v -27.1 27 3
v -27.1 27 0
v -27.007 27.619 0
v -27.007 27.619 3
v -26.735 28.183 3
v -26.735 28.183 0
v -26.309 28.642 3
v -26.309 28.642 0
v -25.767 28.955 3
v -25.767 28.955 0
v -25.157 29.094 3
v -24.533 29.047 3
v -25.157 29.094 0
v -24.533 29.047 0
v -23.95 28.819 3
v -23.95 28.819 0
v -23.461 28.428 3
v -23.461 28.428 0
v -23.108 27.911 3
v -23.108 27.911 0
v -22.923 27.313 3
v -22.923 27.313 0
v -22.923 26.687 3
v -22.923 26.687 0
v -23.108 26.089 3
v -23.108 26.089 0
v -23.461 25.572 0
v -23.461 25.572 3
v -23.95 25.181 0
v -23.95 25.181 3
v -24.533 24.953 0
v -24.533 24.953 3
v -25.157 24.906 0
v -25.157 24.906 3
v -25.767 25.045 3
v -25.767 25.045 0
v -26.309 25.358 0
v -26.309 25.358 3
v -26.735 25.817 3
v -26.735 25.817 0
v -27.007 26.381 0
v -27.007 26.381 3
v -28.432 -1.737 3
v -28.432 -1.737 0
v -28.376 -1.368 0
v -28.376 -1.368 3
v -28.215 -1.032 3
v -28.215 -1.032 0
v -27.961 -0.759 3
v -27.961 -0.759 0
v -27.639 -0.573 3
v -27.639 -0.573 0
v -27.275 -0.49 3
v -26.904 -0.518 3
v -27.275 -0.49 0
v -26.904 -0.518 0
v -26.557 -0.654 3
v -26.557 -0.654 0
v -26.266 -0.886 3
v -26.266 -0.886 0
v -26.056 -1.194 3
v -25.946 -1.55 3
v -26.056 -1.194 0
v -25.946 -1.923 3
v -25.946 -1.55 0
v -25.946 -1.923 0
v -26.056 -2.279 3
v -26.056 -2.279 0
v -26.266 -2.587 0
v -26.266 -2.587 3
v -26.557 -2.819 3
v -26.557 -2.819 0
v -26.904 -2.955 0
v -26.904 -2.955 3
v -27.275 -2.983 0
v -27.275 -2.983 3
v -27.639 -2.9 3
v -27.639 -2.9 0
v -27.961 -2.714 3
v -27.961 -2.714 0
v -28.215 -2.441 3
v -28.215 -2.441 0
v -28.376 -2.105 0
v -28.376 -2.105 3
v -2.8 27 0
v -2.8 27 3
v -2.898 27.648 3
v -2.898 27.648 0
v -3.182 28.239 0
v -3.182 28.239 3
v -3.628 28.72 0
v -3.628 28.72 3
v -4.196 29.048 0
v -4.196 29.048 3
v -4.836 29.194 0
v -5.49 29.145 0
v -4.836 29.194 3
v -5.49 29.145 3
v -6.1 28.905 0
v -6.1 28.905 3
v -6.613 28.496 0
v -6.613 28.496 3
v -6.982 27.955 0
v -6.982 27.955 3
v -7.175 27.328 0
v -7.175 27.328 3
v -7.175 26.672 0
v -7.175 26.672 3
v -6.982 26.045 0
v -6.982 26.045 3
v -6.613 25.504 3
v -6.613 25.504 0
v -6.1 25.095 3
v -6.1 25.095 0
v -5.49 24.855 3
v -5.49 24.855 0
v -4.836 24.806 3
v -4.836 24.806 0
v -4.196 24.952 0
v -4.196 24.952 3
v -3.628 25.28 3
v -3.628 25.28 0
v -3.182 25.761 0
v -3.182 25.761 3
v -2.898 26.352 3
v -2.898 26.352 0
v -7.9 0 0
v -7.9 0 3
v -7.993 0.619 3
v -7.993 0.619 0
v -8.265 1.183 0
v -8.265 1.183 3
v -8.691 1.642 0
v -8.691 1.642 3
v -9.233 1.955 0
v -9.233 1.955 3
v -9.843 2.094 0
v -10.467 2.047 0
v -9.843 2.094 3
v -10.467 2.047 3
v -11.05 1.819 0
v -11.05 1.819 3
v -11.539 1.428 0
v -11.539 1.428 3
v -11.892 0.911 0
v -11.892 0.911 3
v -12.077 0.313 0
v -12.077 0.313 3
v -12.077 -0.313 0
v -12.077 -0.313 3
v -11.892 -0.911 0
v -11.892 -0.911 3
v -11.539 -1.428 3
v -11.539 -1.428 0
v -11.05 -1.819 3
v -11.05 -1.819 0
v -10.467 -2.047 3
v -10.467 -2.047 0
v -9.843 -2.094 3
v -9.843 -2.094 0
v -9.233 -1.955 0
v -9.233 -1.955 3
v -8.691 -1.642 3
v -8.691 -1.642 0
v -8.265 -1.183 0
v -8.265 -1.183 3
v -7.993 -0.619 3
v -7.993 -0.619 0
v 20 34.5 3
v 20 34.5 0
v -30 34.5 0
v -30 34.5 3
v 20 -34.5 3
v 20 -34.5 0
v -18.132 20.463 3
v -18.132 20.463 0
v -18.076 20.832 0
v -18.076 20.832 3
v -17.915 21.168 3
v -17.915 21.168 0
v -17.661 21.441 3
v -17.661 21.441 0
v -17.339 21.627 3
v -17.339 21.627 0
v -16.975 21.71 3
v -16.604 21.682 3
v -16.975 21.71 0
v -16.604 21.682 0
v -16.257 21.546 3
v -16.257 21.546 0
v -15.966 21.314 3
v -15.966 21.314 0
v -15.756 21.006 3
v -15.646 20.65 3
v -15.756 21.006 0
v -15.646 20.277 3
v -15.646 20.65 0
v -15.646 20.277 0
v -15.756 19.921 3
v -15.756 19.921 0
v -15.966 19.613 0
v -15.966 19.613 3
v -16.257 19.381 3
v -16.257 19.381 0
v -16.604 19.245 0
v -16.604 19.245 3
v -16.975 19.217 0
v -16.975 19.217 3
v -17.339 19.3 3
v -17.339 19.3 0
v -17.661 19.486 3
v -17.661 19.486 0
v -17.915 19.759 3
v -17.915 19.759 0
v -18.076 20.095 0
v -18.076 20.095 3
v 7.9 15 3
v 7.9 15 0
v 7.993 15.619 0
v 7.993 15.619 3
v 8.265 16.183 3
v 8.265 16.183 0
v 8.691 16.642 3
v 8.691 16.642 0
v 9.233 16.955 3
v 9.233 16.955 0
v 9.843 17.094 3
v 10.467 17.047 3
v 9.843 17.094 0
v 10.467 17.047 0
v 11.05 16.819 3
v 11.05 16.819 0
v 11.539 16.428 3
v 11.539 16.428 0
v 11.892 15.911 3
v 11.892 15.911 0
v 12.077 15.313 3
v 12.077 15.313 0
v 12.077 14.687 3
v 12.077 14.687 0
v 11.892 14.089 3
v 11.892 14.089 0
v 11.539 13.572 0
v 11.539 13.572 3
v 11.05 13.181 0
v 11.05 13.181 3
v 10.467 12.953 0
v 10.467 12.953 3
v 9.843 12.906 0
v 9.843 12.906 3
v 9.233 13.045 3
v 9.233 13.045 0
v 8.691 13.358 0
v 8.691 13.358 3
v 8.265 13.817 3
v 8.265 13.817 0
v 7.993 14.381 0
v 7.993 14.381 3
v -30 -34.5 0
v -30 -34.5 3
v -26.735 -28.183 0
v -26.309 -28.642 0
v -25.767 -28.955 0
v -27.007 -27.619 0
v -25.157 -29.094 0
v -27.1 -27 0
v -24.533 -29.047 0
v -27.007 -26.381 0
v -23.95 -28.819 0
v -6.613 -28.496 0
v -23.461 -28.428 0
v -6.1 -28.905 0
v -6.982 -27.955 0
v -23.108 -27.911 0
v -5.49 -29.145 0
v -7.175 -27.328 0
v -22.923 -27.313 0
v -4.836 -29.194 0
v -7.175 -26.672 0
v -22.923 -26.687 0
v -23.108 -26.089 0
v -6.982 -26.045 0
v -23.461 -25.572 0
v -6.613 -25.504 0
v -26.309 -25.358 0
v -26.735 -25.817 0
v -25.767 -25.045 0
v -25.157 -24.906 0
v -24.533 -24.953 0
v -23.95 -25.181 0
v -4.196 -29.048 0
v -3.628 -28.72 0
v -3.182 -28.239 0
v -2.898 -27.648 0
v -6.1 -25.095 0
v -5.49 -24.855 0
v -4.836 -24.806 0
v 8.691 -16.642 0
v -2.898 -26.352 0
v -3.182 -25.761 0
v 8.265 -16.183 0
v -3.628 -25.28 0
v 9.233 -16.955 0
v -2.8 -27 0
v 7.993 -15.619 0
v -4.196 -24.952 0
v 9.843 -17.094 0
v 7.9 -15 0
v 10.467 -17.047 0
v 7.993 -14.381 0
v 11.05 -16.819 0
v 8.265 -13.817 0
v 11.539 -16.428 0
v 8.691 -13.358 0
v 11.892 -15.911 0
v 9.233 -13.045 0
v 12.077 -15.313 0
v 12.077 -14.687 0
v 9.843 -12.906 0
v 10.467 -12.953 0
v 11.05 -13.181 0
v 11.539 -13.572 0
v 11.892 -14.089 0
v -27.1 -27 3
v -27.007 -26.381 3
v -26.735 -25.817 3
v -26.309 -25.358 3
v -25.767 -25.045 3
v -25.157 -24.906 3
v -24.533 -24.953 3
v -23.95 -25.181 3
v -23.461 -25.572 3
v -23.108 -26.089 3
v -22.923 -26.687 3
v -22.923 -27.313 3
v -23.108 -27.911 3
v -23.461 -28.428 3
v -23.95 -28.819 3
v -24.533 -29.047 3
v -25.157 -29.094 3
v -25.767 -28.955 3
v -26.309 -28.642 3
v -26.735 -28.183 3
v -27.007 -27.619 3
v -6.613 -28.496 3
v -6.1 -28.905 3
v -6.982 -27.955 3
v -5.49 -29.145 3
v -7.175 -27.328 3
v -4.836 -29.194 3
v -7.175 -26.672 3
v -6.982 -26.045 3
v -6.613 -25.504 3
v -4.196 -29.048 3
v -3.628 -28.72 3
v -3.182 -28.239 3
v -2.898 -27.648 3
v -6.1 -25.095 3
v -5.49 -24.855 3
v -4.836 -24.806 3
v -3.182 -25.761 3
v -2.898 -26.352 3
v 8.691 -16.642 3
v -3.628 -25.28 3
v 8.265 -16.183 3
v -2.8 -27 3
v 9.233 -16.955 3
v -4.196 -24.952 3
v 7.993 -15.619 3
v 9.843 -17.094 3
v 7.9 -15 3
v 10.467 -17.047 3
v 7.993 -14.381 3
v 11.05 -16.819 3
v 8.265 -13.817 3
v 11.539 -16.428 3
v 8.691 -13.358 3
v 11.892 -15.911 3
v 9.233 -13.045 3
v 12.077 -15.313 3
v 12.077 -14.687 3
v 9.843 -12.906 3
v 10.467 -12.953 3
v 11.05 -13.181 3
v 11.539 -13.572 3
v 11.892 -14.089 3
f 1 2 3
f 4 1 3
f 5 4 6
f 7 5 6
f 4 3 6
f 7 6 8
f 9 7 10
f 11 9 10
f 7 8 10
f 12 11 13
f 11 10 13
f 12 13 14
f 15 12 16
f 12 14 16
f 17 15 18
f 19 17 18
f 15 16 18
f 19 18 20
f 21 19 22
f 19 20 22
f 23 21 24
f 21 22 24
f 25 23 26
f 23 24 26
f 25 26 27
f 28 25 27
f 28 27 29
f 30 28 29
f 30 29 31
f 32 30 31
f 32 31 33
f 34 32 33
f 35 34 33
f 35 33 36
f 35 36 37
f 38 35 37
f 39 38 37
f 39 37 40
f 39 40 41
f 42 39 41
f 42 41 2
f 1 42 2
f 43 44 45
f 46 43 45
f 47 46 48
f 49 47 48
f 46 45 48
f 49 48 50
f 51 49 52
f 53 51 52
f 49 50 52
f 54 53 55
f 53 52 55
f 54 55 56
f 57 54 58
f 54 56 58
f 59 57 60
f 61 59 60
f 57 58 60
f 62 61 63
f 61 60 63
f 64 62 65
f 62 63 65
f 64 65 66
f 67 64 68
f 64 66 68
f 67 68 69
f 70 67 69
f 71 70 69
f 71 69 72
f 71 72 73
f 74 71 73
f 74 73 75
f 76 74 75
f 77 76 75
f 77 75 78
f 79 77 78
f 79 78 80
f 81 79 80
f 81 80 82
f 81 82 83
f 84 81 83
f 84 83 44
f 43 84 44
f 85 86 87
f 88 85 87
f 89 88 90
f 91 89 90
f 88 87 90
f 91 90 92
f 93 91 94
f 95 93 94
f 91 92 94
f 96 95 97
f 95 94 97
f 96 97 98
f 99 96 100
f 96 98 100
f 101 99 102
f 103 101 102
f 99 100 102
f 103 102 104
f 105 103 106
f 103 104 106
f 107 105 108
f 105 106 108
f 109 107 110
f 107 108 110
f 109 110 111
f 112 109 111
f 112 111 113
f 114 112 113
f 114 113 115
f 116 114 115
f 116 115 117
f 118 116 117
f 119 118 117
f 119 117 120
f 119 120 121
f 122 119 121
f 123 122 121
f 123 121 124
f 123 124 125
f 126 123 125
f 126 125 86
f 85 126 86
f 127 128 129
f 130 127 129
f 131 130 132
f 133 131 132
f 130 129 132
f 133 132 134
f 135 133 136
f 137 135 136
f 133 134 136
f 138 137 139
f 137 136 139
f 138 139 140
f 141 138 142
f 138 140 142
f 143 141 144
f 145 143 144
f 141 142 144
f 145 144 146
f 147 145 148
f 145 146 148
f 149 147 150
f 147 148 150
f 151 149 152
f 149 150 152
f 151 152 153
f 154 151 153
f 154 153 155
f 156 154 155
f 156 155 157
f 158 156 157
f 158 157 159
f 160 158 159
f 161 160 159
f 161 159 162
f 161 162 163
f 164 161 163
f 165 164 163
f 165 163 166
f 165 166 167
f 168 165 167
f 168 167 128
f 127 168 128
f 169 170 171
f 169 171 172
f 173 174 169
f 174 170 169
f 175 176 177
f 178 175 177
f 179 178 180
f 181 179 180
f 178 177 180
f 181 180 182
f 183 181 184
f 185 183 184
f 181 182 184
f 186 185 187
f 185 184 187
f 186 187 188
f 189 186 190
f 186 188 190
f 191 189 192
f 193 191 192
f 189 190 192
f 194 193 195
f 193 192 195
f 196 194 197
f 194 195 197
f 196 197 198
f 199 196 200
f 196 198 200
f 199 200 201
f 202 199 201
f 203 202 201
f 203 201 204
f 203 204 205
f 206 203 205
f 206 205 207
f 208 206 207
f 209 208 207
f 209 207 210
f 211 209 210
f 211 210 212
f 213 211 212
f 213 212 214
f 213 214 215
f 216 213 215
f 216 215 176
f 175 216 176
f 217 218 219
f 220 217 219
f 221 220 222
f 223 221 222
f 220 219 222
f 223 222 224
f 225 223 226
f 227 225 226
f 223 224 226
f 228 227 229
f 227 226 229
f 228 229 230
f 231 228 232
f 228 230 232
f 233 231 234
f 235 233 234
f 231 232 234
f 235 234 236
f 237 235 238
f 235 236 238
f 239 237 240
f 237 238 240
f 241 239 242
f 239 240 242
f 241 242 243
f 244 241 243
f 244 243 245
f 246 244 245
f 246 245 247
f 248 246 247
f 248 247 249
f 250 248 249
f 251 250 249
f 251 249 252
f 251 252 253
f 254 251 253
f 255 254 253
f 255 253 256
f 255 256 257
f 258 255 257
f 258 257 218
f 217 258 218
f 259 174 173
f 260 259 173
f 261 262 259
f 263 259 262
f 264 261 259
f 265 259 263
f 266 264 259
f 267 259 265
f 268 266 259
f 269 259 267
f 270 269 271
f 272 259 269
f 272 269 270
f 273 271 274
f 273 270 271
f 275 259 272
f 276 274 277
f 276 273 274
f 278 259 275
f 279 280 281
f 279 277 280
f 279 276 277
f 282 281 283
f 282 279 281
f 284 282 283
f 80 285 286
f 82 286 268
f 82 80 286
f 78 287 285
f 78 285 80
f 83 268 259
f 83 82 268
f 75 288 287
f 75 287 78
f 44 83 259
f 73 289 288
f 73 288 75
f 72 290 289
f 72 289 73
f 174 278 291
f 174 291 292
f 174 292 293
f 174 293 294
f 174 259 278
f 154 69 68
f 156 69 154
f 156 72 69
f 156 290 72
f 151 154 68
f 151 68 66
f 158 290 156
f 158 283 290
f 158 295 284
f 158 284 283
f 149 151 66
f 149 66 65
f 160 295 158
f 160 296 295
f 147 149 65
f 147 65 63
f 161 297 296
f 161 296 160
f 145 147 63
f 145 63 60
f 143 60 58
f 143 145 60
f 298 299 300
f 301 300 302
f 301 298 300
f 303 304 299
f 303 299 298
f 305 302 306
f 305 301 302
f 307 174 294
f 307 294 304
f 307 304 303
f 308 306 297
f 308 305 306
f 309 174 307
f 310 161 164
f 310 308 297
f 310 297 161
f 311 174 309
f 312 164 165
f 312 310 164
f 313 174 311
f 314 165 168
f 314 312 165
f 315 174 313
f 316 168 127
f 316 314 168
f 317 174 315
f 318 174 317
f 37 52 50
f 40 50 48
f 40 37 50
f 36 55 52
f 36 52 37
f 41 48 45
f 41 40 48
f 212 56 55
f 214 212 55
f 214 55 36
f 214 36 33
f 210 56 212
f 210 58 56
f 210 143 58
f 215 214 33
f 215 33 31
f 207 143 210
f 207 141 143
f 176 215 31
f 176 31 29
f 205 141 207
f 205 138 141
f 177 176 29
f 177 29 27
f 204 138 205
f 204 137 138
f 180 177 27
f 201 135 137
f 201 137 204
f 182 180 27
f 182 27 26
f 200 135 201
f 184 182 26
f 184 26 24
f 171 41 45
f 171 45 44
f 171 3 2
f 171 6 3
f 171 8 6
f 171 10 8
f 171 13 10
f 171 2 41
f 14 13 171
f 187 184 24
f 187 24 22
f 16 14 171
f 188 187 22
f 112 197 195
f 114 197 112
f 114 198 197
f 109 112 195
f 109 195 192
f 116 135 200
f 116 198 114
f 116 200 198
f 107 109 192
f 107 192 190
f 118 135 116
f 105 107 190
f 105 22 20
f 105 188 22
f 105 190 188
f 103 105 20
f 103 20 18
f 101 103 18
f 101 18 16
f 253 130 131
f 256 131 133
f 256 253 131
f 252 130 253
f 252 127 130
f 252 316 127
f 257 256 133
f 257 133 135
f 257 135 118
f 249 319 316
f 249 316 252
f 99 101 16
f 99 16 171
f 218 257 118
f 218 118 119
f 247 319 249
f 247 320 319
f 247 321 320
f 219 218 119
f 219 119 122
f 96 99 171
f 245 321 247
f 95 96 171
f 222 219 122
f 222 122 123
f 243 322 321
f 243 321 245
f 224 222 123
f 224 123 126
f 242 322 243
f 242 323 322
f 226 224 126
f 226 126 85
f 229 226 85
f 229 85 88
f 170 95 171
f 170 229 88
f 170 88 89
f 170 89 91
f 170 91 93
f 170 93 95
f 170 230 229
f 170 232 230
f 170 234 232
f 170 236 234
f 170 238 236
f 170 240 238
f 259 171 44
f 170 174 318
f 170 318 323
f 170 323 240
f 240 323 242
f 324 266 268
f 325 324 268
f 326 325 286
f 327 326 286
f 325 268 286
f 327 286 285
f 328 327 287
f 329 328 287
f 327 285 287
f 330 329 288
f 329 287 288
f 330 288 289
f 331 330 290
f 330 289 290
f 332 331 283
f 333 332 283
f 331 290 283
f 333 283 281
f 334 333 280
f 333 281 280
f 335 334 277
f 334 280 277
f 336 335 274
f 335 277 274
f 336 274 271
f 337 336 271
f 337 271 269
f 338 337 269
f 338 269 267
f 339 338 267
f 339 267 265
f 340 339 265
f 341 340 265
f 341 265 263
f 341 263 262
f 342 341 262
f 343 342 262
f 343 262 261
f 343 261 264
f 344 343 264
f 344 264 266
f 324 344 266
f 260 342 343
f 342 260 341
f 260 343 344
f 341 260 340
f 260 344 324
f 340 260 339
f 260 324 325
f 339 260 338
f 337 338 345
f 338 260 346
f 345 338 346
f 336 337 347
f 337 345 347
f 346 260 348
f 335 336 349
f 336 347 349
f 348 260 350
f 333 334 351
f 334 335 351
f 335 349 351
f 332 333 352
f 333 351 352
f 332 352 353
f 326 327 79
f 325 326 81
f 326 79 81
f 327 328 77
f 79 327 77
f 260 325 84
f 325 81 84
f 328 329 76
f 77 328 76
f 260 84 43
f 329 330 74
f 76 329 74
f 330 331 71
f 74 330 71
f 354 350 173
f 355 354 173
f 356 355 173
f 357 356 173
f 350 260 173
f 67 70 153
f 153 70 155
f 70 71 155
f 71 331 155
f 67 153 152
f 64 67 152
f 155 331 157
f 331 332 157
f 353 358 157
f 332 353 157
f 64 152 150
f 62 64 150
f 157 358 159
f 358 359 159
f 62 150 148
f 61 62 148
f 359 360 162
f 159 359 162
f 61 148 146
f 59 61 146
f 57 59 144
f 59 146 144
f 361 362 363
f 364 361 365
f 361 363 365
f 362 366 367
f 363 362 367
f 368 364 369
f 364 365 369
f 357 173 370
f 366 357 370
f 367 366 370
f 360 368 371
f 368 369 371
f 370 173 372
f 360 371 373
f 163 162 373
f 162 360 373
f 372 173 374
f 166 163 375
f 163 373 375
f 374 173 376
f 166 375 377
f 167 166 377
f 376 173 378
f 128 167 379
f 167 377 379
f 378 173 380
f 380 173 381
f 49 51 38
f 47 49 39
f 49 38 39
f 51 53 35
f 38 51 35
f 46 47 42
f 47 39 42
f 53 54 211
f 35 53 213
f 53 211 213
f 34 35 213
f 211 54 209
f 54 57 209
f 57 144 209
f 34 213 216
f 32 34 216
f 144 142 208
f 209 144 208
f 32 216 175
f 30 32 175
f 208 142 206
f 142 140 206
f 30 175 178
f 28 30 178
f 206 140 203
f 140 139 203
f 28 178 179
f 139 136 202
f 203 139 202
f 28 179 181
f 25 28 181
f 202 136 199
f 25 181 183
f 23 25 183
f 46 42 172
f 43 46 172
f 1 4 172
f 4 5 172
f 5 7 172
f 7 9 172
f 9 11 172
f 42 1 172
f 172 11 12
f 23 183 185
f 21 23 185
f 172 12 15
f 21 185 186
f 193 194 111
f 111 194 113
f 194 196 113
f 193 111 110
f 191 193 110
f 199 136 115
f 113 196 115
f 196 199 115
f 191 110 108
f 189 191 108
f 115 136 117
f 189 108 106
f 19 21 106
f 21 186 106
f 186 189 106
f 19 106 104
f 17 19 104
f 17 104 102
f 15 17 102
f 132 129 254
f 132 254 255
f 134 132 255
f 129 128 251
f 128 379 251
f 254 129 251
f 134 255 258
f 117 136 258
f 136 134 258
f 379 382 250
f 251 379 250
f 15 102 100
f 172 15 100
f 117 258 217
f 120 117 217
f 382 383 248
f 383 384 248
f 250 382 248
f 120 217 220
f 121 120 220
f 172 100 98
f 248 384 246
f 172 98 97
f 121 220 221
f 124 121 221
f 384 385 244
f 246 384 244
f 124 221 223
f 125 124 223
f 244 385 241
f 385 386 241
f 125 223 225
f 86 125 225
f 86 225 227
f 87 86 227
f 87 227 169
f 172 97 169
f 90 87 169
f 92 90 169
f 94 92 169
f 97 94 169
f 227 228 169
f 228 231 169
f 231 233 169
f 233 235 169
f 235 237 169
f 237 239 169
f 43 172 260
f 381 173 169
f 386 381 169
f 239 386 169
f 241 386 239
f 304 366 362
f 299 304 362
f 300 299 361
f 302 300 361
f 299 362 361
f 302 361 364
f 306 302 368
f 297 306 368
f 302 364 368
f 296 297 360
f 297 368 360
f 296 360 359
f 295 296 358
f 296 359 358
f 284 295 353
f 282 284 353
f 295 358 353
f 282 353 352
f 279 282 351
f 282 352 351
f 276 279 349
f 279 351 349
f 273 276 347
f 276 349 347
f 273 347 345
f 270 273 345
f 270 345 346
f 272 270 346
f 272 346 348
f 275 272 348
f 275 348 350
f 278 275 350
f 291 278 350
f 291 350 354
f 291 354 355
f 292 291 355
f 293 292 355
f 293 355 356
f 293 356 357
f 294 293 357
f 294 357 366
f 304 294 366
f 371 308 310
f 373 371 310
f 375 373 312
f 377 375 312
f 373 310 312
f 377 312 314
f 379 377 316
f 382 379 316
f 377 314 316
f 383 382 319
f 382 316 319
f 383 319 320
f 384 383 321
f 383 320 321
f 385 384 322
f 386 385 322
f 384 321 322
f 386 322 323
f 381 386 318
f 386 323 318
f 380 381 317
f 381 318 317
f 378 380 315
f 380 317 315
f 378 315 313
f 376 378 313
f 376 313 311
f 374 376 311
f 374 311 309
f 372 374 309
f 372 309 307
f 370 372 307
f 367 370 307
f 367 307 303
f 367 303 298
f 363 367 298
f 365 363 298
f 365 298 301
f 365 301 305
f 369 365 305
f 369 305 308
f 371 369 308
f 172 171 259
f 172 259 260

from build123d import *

# Parameters (mm, degrees)
SKETCH_1_W          = 40
SKETCH_1_H          = 29
EXTRUDE_1_DEPTH     = 3
SKETCH_3_W          = 40
SKETCH_3_H          = 3
EXTRUDE_2_DEPTH     = 3
SKETCH_4_W          = 40
SKETCH_4_H          = 3
EXTRUDE_3_DEPTH     = 3
SKETCH_5_W          = 40
SKETCH_5_H          = 3
EXTRUDE_4_DEPTH     = 7
SKETCH_6_W          = 40
SKETCH_6_H          = 3
EXTRUDE_5_DEPTH     = 7
SKETCH_7_W          = 40
SKETCH_7_H          = 3
EXTRUDE_6_DEPTH     = 10
SKETCH_8_W          = 40
SKETCH_8_H          = 3
EXTRUDE_7_DEPTH     = 10
SKETCH_9_R          = 2.2
CUT_EXTRUDE_2_DEPTH = 15
CUT_EXTRUDE_3_DEPTH = 4
SKETCH_12_W         = 3
SKETCH_12_H         = 69
EXTRUDE_9_DEPTH     = 30
SKETCH_15_R         = 2.1
CUT_EXTRUDE_4_DEPTH = 10
SKETCH_16_R         = 2.1
CUT_EXTRUDE_5_DEPTH = 10
SKETCH_17_W         = 3
SKETCH_17_H         = 69
CUT_EXTRUDE_6_DEPTH = 20
M3X0_5_1_D          = 2.5
M3X0_5_1_DEPTH      = 8.5
M3X0_5_1_TIP        = 0.751075774
SKETCH_20_R         = 2.1
CUT_EXTRUDE_7_DEPTH = 10


with BuildPart() as part:
    # ｽｹｯﾁ1 → ﾎﾞｽ - 押し出し1 (new body)
    with BuildSketch(Plane.XY):
        Rectangle(SKETCH_1_W, SKETCH_1_H)
    extrude(amount=EXTRUDE_1_DEPTH)

    # ｽｹｯﾁ3 → ﾎﾞｽ - 押し出し2 (add)
    with BuildSketch(Plane(origin=(0, -14.5, 0), x_dir=(-1, 0, 0), z_dir=(0, -1, 0))):
        with Locations((0, -1.5)):
            Rectangle(SKETCH_3_W, SKETCH_3_H)
    extrude(amount=EXTRUDE_2_DEPTH)

    # ｽｹｯﾁ4 → ﾎﾞｽ - 押し出し3 (add)
    with BuildSketch(Plane(origin=(0, 14.5, 0), x_dir=(1, 0, 0), z_dir=(0, 1, 0))):
        with Locations((0, -1.5)):
            Rectangle(SKETCH_4_W, SKETCH_4_H)
    extrude(amount=EXTRUDE_3_DEPTH)

    # ｽｹｯﾁ5 → ﾎﾞｽ - 押し出し4 (add)
    with BuildSketch(Plane.XZ.offset(17.5)):
        with Locations((0, 1.5)):
            Rectangle(SKETCH_5_W, SKETCH_5_H)
    extrude(amount=EXTRUDE_4_DEPTH)

    # ｽｹｯﾁ6 → ﾎﾞｽ - 押し出し5 (add)
    with BuildSketch(Plane(origin=(0, 17.5, 0), x_dir=(1, 0, 0), z_dir=(0, 1, 0))):
        with Locations((0, -1.5)):
            Rectangle(SKETCH_6_W, SKETCH_6_H)
    extrude(amount=EXTRUDE_5_DEPTH)

    # ｽｹｯﾁ7 → ﾎﾞｽ - 押し出し6 (add)
    with BuildSketch(Plane(origin=(0, 24.5, 0), x_dir=(1, 0, 0), z_dir=(0, 1, 0))):
        with Locations((0, -1.5)):
            Rectangle(SKETCH_7_W, SKETCH_7_H)
    extrude(amount=EXTRUDE_6_DEPTH)

    # ｽｹｯﾁ8 → ﾎﾞｽ - 押し出し7 (add)
    with BuildSketch(Plane.XZ.offset(24.5)):
        with Locations((0, 1.5)):
            Rectangle(SKETCH_8_W, SKETCH_8_H)
    extrude(amount=EXTRUDE_7_DEPTH)

    # ｽｹｯﾁ9 → ｶｯﾄ - 押し出し2 (cut)
    with BuildSketch(Plane.XY.offset(3)):
        with Locations((-5, 27)):
            Circle(SKETCH_9_R)
    extrude(amount=-CUT_EXTRUDE_2_DEPTH, mode=Mode.SUBTRACT)

    # ｽｹｯﾁ10 → ｶｯﾄ - 押し出し3 (cut, through all)
    with BuildSketch(Plane.XY.offset(3)):
        with BuildLine():
            ThreePointArc((-7.2, -27), (-5, -29.2), (-2.8, -27))
            Line((-2.8, -27), (-5, -27))
            Line((-5, -27), (-7.2, -27))
        make_face()
        with BuildLine():
            Line((-5, -27), (-2.8, -27))
            ThreePointArc((-2.8, -27), (-5, -24.8), (-7.2, -27))
            Line((-7.2, -27), (-5, -27))
        make_face()
    extrude(amount=-CUT_EXTRUDE_3_DEPTH, mode=Mode.SUBTRACT)

    # ｽｹｯﾁ12 → ﾎﾞｽ - 押し出し9 (add)
    with BuildSketch(Plane.ZY.offset(20)):
        with Locations((1.5, 0)):
            Rectangle(SKETCH_12_W, SKETCH_12_H)
    extrude(amount=EXTRUDE_9_DEPTH)

    # ｽｹｯﾁ15 → ｶｯﾄ - 押し出し4 (cut)
    with BuildSketch(Plane.XY.offset(3)):
        with Locations((-10, 0)):
            Circle(SKETCH_15_R)
    extrude(amount=-CUT_EXTRUDE_4_DEPTH, mode=Mode.SUBTRACT)

    # ｽｹｯﾁ16 → ｶｯﾄ - 押し出し5 (cut)
    with BuildSketch(Plane(origin=(0, 0, 0), x_dir=(-1, 0, 0), z_dir=(0, 0, -1))):
        with Locations((-10, -15)):
            Circle(SKETCH_16_R)
        with Locations((-10, 15)):
            Circle(SKETCH_16_R)
    extrude(amount=-CUT_EXTRUDE_5_DEPTH, mode=Mode.SUBTRACT)

    # ｽｹｯﾁ17 → ｶｯﾄ - 押し出し6 (cut)
    with BuildSketch(Plane.ZY.offset(50)):
        with Locations((1.5, 0)):
            Rectangle(SKETCH_17_W, SKETCH_17_H)
    extrude(amount=-CUT_EXTRUDE_6_DEPTH, mode=Mode.SUBTRACT)

    # M3x0.5 ねじ穴1
    with Locations(Plane(origin=(-16.881888018, 20.463438375, 3), x_dir=(1, 0, 0), z_dir=(0, 0, 1))):
        with Locations((0, 0), (-10.3, -22.2)):
            Hole(M3X0_5_1_D / 2, depth=M3X0_5_1_DEPTH)
            with Locations((0, 0, -(M3X0_5_1_DEPTH + M3X0_5_1_TIP / 2))):  # 118° drill point
                Cone(0, M3X0_5_1_D / 2, M3X0_5_1_TIP, mode=Mode.SUBTRACT)

    # ｽｹｯﾁ20 → ｶｯﾄ - 押し出し7 (cut)
    with BuildSketch(Plane(origin=(0, 0, 0), x_dir=(-1, 0, 0), z_dir=(0, 0, -1))):
        with Locations((25, -27)):
            Circle(SKETCH_20_R)
        with Locations((25, 27)):
            Circle(SKETCH_20_R)
    extrude(amount=-CUT_EXTRUDE_7_DEPTH, mode=Mode.SUBTRACT)


solid = part.part
